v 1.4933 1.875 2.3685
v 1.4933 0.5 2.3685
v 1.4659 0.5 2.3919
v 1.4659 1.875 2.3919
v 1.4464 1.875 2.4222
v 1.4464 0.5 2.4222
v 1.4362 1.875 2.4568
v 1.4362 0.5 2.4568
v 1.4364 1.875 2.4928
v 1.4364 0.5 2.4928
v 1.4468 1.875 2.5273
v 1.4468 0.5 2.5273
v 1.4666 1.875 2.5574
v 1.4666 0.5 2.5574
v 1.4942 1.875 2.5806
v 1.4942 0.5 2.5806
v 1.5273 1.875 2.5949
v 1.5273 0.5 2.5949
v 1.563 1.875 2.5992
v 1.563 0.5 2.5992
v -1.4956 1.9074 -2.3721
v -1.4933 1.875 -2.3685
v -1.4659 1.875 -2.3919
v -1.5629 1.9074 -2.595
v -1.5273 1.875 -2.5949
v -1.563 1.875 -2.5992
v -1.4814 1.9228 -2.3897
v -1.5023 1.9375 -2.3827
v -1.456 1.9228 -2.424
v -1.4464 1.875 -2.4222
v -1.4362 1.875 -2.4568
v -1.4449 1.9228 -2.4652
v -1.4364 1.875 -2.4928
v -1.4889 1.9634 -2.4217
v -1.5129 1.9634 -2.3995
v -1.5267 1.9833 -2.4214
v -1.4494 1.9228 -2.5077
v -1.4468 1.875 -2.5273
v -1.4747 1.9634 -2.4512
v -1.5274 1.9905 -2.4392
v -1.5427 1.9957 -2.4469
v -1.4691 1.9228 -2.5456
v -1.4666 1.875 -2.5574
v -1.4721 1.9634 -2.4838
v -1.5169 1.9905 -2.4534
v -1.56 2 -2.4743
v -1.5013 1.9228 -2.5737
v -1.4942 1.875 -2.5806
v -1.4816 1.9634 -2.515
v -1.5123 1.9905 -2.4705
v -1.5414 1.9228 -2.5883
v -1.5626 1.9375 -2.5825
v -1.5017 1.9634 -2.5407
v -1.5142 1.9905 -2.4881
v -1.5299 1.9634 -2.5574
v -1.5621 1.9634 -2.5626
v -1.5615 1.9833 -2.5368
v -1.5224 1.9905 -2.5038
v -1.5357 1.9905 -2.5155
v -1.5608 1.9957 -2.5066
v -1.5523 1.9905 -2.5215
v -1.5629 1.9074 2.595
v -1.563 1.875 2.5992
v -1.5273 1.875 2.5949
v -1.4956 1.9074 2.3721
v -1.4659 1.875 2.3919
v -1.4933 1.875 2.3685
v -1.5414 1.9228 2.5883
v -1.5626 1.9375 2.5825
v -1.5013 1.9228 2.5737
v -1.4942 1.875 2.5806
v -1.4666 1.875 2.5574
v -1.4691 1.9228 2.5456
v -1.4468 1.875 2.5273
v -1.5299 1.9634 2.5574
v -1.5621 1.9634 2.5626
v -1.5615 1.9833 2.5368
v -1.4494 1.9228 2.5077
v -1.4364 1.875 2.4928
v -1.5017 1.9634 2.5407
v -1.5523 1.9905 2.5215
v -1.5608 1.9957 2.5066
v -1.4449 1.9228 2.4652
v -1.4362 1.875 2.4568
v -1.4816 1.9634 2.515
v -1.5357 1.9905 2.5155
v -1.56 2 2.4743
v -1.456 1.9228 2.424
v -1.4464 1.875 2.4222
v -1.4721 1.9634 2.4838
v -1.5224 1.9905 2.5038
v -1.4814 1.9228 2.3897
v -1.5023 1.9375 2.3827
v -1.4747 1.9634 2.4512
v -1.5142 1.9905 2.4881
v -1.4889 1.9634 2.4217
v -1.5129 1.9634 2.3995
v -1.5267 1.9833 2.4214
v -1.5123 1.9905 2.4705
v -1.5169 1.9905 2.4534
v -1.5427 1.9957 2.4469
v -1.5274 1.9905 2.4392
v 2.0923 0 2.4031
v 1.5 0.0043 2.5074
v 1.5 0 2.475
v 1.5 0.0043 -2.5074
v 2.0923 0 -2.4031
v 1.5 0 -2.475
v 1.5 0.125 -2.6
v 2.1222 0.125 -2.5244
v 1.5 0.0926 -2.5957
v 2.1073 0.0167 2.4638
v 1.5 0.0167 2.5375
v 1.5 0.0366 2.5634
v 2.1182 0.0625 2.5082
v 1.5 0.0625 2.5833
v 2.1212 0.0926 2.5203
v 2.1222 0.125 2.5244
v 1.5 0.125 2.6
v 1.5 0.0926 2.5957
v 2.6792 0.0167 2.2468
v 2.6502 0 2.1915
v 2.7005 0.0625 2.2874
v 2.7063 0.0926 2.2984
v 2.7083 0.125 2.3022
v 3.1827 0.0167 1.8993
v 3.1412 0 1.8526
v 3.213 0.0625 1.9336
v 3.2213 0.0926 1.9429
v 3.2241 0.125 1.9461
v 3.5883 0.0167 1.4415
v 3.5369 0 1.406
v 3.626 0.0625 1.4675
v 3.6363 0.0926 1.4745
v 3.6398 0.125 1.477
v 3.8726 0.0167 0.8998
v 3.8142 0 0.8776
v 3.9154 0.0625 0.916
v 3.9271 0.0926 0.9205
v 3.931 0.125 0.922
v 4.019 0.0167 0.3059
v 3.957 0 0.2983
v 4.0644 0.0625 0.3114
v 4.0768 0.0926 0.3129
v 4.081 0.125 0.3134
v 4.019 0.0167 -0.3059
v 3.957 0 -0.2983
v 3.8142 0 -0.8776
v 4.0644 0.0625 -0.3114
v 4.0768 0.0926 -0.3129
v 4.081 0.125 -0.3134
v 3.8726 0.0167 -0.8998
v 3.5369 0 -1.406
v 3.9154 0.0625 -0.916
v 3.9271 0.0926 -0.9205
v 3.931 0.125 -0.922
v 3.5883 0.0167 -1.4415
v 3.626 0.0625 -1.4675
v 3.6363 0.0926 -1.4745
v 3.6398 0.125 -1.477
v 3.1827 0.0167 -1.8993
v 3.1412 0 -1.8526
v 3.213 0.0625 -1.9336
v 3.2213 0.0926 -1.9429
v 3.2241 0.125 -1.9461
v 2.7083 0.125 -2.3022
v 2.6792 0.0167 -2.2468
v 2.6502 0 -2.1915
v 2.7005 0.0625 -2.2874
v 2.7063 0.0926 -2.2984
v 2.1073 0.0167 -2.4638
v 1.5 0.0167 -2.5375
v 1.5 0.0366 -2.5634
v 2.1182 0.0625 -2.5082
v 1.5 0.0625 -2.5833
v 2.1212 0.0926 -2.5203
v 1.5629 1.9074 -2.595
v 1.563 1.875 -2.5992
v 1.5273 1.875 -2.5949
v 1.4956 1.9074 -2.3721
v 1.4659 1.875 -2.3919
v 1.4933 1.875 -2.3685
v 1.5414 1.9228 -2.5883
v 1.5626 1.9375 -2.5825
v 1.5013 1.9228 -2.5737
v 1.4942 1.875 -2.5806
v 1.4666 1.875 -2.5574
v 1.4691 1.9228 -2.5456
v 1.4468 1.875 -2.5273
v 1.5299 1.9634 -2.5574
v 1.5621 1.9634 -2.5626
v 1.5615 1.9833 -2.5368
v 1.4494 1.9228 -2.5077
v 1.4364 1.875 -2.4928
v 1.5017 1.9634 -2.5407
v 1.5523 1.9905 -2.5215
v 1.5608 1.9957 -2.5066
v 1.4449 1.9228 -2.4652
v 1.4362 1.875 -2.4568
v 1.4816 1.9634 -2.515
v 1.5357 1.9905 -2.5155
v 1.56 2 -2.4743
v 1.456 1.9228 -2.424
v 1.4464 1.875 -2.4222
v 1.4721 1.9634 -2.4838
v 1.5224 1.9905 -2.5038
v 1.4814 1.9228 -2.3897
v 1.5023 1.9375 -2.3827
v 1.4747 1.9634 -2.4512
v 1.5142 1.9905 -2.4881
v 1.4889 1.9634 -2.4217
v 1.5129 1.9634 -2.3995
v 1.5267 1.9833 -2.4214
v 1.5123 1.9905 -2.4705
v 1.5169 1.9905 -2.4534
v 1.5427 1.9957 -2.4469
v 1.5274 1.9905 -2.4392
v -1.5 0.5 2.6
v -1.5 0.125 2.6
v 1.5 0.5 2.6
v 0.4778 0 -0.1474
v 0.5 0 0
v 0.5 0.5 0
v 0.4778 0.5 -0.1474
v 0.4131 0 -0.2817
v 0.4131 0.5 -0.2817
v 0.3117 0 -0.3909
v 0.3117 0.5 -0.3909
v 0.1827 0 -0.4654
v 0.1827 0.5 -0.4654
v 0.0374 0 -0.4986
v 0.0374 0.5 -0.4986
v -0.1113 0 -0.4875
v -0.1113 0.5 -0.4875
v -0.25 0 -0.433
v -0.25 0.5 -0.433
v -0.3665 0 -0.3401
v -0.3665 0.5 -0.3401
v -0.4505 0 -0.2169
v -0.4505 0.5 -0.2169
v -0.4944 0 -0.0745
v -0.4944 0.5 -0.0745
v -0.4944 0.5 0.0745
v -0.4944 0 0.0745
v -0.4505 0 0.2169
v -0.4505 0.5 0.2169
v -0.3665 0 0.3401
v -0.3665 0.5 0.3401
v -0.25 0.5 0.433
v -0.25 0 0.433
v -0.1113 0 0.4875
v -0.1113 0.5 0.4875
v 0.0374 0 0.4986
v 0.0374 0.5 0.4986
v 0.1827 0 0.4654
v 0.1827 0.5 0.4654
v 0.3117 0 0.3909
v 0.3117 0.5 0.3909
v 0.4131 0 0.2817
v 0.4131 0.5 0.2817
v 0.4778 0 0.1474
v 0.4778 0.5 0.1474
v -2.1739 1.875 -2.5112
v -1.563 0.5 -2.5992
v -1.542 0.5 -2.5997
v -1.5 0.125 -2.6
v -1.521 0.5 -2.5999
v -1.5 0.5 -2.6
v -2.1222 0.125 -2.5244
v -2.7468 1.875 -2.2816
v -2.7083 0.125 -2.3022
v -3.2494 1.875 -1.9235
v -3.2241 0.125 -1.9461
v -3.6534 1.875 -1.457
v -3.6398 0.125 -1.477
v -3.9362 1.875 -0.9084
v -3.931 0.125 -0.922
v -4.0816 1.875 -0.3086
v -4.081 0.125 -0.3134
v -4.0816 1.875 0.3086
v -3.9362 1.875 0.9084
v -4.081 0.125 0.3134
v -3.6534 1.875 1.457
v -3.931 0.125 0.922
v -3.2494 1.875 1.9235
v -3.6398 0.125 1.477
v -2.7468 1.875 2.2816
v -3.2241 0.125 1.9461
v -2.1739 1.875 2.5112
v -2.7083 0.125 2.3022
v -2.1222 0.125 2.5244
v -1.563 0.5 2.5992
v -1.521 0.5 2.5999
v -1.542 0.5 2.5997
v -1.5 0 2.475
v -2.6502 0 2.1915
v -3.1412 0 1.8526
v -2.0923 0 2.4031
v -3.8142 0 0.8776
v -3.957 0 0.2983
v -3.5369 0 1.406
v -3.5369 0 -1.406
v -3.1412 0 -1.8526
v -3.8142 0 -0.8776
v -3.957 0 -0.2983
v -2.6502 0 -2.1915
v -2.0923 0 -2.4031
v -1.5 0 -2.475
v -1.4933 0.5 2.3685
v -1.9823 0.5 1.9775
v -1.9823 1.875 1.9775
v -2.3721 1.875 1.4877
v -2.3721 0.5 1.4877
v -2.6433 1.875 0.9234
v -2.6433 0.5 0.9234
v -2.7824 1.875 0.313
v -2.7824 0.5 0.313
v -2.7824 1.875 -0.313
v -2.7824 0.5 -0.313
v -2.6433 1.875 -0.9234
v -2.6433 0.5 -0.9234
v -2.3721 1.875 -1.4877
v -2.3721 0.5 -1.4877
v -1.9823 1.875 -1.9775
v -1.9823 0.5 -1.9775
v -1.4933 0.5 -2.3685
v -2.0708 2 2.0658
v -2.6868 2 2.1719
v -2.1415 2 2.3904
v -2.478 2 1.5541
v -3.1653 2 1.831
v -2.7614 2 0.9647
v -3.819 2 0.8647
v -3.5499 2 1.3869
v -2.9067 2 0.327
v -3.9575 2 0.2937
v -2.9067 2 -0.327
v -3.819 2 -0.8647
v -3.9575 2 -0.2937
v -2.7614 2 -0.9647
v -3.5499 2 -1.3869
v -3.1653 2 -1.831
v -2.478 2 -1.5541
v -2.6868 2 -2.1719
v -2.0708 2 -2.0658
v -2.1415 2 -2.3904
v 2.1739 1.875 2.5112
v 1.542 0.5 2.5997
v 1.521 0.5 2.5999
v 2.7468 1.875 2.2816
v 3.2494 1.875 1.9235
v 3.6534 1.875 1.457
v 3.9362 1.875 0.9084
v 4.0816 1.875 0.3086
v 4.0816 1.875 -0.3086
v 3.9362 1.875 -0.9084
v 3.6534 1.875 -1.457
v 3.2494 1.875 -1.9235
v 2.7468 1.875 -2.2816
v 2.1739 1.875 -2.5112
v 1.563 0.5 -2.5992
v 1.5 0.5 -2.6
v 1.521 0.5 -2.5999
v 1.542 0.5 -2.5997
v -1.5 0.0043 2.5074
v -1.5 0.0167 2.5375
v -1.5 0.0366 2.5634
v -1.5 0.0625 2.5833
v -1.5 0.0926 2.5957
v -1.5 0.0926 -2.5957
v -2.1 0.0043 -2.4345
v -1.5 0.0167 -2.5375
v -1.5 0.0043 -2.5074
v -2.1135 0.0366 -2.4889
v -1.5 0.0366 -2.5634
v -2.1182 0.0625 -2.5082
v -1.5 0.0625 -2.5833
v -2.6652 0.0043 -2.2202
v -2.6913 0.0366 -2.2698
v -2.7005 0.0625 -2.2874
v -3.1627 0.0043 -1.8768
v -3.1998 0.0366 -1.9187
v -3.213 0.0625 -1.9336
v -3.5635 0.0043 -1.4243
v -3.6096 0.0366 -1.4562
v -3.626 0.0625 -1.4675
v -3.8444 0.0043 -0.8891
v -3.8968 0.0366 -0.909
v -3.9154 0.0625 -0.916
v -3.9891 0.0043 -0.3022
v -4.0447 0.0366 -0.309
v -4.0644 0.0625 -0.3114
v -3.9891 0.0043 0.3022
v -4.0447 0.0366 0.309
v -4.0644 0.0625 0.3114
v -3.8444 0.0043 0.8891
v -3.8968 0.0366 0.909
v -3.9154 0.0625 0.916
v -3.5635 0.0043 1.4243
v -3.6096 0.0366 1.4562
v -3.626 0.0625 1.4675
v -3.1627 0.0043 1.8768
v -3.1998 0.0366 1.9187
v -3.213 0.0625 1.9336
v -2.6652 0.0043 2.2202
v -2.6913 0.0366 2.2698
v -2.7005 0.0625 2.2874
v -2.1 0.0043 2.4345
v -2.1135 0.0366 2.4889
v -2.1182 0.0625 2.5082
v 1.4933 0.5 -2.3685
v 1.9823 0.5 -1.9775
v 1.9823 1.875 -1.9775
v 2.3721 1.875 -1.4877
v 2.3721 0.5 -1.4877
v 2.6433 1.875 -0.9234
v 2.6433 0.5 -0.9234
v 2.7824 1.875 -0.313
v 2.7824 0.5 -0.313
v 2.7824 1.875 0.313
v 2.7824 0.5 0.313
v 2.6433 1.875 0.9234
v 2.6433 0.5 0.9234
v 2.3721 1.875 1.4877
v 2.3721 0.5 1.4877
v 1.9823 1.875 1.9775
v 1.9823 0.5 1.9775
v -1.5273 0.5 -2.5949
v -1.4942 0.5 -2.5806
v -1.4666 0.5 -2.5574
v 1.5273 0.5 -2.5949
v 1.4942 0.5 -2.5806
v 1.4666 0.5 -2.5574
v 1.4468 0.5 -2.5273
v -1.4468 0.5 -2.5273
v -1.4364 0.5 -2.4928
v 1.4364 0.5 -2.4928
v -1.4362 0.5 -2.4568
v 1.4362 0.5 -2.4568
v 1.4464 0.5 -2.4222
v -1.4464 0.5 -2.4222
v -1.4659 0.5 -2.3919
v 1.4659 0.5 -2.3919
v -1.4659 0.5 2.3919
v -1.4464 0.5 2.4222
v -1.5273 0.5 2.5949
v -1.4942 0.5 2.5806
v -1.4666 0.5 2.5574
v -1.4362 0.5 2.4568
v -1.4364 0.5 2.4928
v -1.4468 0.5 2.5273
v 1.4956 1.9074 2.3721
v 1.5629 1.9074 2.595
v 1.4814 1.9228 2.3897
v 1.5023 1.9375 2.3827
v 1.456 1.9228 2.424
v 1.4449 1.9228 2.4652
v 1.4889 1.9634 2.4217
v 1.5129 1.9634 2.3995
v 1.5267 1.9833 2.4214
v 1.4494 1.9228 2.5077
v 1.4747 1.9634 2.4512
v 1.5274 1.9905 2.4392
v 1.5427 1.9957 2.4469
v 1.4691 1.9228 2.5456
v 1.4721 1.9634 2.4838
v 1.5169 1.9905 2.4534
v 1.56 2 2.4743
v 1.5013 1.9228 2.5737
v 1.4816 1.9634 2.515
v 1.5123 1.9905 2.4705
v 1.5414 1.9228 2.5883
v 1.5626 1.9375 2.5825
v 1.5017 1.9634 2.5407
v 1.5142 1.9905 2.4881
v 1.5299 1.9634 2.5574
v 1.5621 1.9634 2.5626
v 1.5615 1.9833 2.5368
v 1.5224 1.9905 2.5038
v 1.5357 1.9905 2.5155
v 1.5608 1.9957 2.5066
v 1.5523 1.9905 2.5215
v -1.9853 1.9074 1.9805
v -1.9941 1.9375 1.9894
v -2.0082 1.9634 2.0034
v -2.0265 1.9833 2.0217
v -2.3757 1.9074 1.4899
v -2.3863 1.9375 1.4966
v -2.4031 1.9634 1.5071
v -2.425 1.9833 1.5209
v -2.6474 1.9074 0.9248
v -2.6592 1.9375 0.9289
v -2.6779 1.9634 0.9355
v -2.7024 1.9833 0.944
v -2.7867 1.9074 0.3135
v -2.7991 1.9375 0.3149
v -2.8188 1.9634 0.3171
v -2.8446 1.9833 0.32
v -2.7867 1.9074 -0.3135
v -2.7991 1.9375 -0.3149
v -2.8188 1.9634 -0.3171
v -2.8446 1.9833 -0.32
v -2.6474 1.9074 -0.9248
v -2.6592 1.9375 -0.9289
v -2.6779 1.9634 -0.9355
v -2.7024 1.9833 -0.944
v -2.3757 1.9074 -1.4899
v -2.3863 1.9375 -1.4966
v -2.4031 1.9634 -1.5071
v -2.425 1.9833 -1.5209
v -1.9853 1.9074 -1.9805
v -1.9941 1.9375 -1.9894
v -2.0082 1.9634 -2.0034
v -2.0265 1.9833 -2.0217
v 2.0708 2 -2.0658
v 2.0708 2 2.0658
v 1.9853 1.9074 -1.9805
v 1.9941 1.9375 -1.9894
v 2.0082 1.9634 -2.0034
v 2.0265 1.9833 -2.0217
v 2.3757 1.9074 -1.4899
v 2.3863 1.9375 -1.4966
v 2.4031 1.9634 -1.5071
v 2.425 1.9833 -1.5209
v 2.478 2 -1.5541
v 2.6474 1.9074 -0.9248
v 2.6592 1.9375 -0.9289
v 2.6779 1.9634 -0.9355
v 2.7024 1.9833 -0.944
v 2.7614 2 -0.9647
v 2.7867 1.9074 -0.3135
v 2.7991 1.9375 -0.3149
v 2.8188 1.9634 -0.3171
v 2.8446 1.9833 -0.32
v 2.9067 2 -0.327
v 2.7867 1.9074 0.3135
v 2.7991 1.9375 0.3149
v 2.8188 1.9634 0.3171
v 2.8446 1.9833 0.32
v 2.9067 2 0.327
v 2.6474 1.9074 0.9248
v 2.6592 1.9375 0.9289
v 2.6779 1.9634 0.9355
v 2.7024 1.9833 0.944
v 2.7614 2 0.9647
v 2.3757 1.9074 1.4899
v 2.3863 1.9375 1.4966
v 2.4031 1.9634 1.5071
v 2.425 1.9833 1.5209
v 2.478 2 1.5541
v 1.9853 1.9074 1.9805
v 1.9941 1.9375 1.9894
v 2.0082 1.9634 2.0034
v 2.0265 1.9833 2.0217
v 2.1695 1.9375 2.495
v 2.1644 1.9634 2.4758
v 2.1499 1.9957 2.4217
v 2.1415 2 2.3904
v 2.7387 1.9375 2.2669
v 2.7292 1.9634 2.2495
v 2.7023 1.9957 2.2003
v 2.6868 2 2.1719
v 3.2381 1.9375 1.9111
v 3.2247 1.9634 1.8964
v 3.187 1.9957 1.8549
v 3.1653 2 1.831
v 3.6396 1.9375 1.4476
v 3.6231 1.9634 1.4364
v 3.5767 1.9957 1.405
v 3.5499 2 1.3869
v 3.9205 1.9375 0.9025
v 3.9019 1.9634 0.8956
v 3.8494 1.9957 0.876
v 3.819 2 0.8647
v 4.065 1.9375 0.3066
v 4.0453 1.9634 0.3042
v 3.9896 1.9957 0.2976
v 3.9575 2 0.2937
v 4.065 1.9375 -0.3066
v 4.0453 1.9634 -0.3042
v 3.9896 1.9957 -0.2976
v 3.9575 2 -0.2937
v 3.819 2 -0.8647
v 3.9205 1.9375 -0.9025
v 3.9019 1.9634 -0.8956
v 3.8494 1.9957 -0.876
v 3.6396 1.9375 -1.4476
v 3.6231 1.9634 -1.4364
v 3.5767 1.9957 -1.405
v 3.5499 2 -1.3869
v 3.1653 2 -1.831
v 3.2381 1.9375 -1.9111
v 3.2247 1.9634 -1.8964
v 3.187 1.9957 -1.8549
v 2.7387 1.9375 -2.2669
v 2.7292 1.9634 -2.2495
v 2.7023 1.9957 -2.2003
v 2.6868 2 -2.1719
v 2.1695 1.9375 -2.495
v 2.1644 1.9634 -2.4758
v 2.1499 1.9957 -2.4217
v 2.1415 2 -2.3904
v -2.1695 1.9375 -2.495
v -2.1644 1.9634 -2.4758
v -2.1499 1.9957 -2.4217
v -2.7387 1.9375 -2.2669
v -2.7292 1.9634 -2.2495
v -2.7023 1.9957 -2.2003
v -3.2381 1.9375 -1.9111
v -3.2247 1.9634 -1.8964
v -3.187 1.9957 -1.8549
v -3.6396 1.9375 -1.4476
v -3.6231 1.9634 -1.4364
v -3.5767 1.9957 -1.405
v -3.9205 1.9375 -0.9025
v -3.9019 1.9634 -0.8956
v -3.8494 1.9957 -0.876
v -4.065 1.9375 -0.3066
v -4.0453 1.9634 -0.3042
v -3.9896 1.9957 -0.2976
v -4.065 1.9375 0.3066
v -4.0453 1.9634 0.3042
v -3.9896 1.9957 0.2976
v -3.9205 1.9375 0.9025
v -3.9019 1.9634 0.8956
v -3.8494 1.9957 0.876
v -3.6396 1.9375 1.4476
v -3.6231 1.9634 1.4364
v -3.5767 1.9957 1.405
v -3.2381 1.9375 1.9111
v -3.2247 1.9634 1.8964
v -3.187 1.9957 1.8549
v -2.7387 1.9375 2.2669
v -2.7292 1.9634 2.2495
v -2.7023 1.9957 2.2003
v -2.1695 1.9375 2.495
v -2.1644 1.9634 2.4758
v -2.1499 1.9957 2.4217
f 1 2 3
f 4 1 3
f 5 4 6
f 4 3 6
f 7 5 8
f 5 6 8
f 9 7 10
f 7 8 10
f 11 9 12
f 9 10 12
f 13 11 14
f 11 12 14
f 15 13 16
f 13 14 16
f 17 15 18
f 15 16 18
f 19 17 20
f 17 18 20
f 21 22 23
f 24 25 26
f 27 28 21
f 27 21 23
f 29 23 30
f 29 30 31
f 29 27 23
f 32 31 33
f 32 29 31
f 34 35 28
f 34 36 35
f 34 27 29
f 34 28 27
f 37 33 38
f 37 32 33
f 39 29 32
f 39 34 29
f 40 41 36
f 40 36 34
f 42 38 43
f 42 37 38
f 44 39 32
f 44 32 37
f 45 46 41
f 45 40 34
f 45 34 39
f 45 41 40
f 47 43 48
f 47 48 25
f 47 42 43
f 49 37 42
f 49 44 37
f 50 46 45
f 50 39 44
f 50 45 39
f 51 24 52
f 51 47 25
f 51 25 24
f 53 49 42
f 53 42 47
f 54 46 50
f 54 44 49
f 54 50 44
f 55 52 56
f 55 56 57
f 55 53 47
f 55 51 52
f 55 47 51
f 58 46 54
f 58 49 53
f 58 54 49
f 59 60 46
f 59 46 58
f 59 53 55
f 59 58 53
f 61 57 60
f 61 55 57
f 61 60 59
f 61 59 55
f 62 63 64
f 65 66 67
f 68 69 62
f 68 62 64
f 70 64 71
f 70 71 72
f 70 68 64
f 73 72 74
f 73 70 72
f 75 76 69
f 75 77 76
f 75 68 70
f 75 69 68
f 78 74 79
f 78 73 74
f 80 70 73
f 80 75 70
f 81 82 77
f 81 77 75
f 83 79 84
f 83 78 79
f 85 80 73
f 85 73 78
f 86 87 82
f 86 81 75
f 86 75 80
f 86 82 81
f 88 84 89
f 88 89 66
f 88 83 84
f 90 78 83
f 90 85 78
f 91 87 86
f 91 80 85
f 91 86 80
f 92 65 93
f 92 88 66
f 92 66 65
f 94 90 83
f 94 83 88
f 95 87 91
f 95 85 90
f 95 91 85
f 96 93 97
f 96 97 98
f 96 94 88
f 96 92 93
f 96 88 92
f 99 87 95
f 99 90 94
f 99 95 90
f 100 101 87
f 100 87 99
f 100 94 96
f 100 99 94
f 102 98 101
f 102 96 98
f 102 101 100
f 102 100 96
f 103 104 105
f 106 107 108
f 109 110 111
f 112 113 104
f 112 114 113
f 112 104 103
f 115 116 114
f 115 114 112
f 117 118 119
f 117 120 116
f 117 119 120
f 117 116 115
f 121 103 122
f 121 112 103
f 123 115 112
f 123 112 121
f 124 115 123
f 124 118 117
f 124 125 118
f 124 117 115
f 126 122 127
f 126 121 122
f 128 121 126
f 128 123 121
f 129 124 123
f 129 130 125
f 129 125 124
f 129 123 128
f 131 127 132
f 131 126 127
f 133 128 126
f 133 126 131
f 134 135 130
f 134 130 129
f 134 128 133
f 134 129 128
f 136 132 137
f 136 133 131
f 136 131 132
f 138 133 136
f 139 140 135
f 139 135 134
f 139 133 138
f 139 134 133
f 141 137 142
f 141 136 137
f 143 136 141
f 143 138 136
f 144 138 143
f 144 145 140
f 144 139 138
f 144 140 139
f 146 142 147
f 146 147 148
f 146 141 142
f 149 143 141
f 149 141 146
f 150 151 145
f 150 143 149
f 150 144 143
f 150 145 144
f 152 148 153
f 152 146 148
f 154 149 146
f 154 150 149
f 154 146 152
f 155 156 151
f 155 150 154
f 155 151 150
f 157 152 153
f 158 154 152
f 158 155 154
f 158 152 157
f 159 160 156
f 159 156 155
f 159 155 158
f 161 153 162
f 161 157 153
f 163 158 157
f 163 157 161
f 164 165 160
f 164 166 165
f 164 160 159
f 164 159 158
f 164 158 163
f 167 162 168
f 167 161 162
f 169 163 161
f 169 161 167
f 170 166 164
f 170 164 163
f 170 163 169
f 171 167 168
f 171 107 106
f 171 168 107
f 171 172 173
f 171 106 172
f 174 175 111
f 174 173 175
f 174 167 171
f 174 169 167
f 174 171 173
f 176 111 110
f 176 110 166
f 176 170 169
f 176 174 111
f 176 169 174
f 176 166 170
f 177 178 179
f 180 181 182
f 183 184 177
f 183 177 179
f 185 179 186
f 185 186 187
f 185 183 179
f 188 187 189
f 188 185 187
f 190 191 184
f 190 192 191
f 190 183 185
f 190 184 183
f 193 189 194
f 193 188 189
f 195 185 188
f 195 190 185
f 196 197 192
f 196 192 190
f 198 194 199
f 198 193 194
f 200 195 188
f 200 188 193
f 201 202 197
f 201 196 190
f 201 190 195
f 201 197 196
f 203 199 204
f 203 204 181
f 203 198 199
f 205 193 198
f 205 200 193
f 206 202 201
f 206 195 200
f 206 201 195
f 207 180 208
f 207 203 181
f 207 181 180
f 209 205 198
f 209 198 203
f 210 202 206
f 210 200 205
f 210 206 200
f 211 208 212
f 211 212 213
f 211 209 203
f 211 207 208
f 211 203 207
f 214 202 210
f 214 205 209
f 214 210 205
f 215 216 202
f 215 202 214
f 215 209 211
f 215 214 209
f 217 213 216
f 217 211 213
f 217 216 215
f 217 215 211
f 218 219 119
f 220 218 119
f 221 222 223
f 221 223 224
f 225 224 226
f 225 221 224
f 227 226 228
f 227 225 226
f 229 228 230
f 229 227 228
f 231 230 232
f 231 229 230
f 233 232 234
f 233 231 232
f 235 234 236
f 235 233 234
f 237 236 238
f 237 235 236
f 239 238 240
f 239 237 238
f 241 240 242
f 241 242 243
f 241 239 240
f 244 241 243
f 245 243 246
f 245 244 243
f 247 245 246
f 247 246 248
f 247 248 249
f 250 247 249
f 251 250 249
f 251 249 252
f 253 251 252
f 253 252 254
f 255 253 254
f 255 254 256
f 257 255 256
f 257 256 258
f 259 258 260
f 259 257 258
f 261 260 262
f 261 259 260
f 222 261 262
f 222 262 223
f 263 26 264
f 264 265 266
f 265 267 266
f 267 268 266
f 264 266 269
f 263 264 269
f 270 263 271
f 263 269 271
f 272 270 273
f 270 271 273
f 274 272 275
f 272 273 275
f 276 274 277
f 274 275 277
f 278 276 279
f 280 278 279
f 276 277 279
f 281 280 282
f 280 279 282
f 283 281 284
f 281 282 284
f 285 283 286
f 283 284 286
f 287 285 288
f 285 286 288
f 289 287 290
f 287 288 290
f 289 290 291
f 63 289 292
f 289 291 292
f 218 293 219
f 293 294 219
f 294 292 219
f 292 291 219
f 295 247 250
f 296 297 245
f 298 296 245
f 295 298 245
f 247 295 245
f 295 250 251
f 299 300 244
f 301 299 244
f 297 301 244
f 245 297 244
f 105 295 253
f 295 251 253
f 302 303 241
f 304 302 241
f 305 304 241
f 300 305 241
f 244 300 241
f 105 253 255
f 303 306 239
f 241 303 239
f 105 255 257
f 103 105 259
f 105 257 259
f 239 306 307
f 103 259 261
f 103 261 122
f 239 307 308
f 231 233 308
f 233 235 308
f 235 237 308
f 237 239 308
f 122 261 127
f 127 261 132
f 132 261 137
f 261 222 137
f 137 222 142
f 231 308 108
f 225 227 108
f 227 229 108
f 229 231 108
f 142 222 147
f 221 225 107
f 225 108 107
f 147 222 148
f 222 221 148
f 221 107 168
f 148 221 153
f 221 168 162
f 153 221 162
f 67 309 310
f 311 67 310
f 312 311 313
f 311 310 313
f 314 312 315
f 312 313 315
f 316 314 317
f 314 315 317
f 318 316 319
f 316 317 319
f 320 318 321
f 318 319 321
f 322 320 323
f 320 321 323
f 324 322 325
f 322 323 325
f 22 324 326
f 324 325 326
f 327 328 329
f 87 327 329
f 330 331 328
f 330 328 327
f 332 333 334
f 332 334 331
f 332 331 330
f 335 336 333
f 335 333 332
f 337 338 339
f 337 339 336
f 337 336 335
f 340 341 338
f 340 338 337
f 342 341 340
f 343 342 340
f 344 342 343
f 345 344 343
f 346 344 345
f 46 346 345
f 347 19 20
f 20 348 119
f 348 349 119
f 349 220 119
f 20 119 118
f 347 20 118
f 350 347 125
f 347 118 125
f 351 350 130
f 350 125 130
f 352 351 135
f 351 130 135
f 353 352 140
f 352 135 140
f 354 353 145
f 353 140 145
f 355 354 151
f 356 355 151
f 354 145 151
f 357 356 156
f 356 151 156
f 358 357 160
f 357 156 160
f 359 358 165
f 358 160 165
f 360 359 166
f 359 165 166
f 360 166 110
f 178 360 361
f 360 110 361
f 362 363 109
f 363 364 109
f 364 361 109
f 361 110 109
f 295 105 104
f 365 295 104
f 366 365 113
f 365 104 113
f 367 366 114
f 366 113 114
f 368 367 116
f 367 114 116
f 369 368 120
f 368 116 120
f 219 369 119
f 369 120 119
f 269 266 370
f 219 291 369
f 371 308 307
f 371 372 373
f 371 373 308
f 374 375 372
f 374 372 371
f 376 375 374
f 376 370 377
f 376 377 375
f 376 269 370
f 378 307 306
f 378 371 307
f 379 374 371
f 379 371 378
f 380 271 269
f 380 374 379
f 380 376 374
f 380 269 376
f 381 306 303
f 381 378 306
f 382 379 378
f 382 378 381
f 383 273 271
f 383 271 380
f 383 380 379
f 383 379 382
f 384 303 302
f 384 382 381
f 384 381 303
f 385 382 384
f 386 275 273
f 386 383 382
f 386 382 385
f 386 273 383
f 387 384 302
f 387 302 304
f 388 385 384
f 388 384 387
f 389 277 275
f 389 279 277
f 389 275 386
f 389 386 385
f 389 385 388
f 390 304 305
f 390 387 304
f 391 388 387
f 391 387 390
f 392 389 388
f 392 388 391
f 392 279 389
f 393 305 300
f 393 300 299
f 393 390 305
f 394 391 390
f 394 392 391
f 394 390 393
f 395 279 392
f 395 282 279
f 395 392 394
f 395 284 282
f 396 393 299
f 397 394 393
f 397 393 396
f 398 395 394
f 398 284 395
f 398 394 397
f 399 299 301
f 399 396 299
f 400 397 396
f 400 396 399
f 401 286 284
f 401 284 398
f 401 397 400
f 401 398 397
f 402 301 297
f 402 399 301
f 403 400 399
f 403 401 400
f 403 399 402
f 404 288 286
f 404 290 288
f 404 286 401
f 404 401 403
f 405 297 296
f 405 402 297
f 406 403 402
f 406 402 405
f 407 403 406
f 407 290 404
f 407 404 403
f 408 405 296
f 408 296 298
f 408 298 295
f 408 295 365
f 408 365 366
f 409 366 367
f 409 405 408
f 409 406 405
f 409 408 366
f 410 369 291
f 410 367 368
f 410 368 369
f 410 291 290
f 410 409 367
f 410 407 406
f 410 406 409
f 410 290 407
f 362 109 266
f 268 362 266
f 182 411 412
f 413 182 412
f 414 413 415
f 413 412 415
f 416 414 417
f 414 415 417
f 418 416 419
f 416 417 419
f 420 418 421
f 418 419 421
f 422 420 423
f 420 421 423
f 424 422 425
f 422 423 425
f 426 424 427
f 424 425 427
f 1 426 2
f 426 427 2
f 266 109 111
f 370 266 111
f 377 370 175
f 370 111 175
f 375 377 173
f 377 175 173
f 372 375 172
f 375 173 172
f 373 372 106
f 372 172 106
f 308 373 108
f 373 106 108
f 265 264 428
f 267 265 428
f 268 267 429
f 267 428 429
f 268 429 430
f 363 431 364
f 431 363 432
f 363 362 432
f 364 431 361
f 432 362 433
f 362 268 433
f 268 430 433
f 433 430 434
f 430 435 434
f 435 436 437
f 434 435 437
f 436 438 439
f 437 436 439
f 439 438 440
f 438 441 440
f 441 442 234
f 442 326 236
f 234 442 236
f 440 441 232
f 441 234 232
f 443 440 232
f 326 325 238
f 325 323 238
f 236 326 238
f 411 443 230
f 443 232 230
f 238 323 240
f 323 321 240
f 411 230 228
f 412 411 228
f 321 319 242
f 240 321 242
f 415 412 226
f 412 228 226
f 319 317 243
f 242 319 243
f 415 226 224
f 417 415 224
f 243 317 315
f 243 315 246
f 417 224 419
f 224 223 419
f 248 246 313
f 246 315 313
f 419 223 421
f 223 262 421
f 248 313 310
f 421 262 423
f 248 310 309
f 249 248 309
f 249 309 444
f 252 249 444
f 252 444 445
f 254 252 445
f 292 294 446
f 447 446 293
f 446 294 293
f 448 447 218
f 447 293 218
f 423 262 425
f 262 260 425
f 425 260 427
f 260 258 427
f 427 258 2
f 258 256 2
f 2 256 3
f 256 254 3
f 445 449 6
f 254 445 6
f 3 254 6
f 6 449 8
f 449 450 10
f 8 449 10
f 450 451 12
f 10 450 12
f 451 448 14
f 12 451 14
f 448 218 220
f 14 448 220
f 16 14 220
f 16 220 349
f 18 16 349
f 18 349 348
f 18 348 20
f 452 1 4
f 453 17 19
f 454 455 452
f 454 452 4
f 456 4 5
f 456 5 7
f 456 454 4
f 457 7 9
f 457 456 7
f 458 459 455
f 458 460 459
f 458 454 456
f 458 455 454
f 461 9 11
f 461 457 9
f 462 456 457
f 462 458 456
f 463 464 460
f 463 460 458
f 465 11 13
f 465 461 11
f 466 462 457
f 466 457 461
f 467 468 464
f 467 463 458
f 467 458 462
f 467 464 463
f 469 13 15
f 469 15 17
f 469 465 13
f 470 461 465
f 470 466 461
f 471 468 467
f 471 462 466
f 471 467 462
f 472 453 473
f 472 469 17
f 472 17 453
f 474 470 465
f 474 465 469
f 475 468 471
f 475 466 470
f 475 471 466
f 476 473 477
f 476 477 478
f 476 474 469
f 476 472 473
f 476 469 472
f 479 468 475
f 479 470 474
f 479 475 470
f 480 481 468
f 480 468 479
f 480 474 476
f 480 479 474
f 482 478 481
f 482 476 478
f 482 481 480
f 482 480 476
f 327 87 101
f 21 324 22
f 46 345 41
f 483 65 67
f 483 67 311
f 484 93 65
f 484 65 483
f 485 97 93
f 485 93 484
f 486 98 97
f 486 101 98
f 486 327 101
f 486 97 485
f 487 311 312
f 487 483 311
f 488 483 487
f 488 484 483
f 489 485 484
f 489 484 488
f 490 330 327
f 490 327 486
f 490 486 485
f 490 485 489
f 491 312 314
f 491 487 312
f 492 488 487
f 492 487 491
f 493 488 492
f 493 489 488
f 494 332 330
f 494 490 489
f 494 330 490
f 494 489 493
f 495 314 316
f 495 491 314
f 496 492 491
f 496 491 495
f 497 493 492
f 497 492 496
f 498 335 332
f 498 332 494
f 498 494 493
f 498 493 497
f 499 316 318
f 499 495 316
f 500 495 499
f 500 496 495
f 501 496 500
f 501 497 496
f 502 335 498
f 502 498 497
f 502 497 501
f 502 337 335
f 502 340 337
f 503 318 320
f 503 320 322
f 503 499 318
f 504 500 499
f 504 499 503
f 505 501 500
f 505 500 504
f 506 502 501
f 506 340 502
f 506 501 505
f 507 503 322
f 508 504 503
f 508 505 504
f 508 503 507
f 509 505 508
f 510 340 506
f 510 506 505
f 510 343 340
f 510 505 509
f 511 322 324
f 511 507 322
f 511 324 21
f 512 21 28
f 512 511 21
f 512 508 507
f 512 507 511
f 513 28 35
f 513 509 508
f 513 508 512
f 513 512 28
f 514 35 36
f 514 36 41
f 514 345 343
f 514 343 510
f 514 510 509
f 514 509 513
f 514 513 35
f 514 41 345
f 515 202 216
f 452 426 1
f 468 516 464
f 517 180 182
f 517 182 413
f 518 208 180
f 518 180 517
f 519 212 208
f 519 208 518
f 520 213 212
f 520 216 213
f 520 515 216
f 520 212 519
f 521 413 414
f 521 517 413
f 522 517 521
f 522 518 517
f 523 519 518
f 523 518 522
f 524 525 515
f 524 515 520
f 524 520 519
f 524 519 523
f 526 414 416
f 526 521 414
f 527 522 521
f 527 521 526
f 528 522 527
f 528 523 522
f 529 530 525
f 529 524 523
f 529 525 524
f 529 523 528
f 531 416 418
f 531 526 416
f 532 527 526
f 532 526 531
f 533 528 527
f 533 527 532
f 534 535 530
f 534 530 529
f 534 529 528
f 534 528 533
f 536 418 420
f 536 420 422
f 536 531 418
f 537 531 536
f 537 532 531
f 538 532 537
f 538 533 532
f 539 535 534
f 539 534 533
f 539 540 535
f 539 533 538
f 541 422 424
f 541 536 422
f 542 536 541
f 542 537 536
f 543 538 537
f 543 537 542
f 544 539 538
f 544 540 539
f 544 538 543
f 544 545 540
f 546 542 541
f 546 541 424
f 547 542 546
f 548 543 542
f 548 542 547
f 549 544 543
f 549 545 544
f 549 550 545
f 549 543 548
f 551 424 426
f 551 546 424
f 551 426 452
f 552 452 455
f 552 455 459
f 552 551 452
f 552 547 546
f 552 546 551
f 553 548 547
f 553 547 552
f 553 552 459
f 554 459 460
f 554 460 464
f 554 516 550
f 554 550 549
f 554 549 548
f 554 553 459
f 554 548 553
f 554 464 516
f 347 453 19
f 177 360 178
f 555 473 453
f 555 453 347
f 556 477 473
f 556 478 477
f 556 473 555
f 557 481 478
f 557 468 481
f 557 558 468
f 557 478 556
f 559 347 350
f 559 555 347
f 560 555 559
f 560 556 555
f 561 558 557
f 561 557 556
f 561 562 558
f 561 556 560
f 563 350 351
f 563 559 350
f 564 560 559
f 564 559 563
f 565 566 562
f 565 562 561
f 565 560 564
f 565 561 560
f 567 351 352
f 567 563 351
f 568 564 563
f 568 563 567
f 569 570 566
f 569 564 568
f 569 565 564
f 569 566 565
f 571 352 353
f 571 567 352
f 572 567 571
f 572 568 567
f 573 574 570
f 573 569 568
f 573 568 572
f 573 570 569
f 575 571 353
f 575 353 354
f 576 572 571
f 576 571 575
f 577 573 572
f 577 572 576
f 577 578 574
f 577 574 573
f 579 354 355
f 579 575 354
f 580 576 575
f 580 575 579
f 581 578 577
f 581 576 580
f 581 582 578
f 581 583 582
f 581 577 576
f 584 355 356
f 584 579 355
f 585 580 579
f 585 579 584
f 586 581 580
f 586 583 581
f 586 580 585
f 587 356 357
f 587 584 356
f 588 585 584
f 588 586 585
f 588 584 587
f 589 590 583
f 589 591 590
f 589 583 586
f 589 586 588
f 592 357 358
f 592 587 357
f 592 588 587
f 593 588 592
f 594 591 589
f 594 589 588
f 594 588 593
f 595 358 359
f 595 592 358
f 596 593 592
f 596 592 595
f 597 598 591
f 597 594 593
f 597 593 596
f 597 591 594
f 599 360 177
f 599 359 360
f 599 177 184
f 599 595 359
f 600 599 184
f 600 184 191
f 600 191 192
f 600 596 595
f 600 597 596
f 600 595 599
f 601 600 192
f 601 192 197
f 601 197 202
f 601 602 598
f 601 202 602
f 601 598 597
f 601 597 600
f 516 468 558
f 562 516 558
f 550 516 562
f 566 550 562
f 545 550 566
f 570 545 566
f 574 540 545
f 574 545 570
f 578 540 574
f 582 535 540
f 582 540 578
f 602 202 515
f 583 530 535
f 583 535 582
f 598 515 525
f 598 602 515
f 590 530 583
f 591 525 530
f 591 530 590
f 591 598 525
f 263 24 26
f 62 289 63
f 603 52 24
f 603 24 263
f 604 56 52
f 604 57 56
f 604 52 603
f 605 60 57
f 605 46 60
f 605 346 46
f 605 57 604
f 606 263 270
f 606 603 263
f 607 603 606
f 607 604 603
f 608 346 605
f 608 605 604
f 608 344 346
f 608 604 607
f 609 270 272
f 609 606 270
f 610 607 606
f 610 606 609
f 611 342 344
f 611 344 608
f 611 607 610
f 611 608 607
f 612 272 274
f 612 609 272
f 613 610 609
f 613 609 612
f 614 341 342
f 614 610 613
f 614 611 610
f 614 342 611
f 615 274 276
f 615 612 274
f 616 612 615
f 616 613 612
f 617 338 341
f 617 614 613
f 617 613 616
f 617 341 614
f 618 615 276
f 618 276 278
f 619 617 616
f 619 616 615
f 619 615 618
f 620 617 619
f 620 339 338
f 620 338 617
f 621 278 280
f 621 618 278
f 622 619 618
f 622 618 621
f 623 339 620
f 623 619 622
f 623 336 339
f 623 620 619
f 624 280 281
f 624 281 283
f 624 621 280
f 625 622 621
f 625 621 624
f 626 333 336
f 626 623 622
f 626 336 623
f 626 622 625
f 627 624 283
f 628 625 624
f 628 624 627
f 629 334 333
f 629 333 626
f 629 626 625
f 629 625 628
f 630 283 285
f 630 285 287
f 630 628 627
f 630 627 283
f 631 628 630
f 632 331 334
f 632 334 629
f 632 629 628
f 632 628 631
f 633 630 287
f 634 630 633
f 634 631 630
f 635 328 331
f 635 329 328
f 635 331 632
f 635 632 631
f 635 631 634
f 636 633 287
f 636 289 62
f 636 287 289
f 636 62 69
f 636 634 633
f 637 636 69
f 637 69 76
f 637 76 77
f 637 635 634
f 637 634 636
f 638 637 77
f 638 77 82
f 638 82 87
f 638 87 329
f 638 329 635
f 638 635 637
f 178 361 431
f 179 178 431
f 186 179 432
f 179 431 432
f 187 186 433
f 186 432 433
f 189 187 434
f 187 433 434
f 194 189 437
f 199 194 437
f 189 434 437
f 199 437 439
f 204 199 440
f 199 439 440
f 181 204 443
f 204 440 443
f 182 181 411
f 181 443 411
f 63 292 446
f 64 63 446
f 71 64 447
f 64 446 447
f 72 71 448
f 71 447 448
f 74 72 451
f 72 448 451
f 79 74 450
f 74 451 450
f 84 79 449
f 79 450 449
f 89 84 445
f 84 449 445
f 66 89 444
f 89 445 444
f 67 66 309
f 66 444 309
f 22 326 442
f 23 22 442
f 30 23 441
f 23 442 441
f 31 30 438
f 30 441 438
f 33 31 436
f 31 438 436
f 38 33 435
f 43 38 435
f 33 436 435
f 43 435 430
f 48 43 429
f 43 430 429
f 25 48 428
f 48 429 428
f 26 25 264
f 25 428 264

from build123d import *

# Parameters (mm, degrees)
BOSS_EXTRUDE1_DEPTH   = 2
BOSS_EXTRUDE1_2_DEPTH = 2
BOSS_EXTRUDE2_DEPTH   = 0.5
HOLE2_OUTLINE_R       = 0.5
HOLE2_DEPTH           = 0.5
FILLET2_R             = 0.125
FILLET3_R             = 0.125


# Read off the part's stored shape, not the designer's step: Hole2
with BuildPart() as part:
    # Sketch1 → Boss-Extrude1 (new body)
    with BuildSketch(Plane(origin=(0, 0, 0), x_dir=(1, 0, 0), z_dir=(0, 1, 0))):
        with BuildLine():
            Line((-1.0392304845412224, 2.6), (-1.5, 2.6))
            ThreePointArc((-1.5, 2.6), (-4.1, -1.7e-16), (-1.4999999999999993, -2.6))
            Line((-1.5, -2.6), (-1.039230484541227, -2.6))
            ThreePointArc((-1.0392304845412341, -2.6000000000000365), (-2.8, 2.83e-15), (-1.0392304845412292, 2.6000000000000387))
        make_face()
    extrude(amount=BOSS_EXTRUDE1_DEPTH)



with BuildPart() as body_2:
    # Sketch1 → Boss-Extrude1 2 (new body)
    with BuildSketch(Plane(origin=(0, 0, 0), x_dir=(1, 0, 0), z_dir=(0, 1, 0))):
        with BuildLine():
            Line((1.4999999999999991, 2.6000000000000005), (1.039230484541188, 2.6000000000000005))
            ThreePointArc((1.0392304845411973, 2.6000000000000516), (2.8000000000000003, 3.11e-15), (1.039230484541203, -2.6000000000000494))
            Line((1.0392304845411937, -2.5999999999999996), (1.5000000000000009, -2.5999999999999996))
            ThreePointArc((1.5000000000000009, -2.5999999999999996), (4.1, 1.73e-15), (1.4999999999999984, 2.6000000000000005))
        make_face()
    extrude(amount=BOSS_EXTRUDE1_2_DEPTH)


with BuildPart() as part_1:
    add(part.part)

    add(body_2.part)  # Boss-Extrude2 merges body 2
    # Sketch1<3> → Boss-Extrude2 (add)
    with BuildSketch(Plane(origin=(0, 0, 0), x_dir=(1, 0, 0), z_dir=(0, 1, 0))):
        with BuildLine():
            Line((1.0392304845411884, 2.6000000000000005), (-1.0392304845412224, 2.6))
            ThreePointArc((-1.0392304845412292, 2.6000000000000387), (-2.8, 2.83e-15), (-1.0392304845412341, -2.6000000000000365))
            Line((-1.039230484541227, -2.6), (1.0392304845411937, -2.5999999999999996))
            ThreePointArc((1.039230484541203, -2.600000000000049), (2.3183879481997147, -1.5700564708450193), (2.8, -6.9e-16))
            ThreePointArc((2.8, 0), (2.318387948199713, 1.5700564708450213), (1.0392304845411973, 2.6000000000000516))
        make_face()
    extrude(amount=BOSS_EXTRUDE2_DEPTH)

    # Hole2 outline → Hole2 (cut)
    with BuildSketch(Plane(origin=(0, 0, 0), x_dir=(1, 0, 0), z_dir=(0, 1, 0))):
        Circle(HOLE2_OUTLINE_R)
    extrude(amount=HOLE2_DEPTH, mode=Mode.SUBTRACT)

    # Fillet2
    # the kernel refuses this fillet: 0.125 mm, written as the material it takes off along each edge
    with BuildSketch(Plane(origin=(1.4999999999999987, 0, -2.6000000000000005), x_dir=(0, 1, 3.55e-15), z_dir=(-1, 0, 1.5e-16))) as fillet2_piece_1:
        with BuildLine():
            CenterArc((FILLET2_R, -FILLET2_R), FILLET2_R, 90.00000000000021, 89.99999999999979)
            Line((4.3e-16, -FILLET2_R), (0, 0))
            Line((0, 0), (FILLET2_R, 0))
        make_face()
    extrude(amount=2.9999999999999987, mode=Mode.SUBTRACT)
    with BuildSketch(Plane(origin=(1.4999999999999996, 0, -3.3e-16), x_dir=(5.1e-16, 0, 1), z_dir=(-1, 0, 5.1e-16))) as fillet2_piece_2:
        with BuildLine():
            CenterArc((2.6 - FILLET2_R, FILLET2_R), FILLET2_R, 270, 90)
            Line((2.6, FILLET2_R), (2.6, 0))
            Line((2.6, 0), (2.6 - FILLET2_R, 0))
        make_face()
    revolve(axis=Axis((1.4999999999999996, 0, -3.3e-16), (0, 1, 0)), revolution_arc=180, mode=Mode.SUBTRACT)
    with BuildSketch(Plane(origin=(1.5000000000000009, 0, 2.5999999999999996), x_dir=(-1.5e-16, 0, -1), z_dir=(-1, 0, 1.5e-16))) as fillet2_piece_3:
        with BuildLine():
            CenterArc((FILLET2_R, -FILLET2_R), FILLET2_R, 90, 90)
            Line((0, -FILLET2_R), (0, 0))
            Line((0, 0), (FILLET2_R, 0))
        make_face()
    extrude(amount=3.0000000000000004, mode=Mode.SUBTRACT)
    with BuildSketch(Plane(origin=(-1.0392304845412306, 0.5, 2.6000000000000183), x_dir=(-0.8909362232588717, 0, -0.4541284466813525), z_dir=(0, 1, 0))) as fillet2_piece_4:
        with BuildLine():
            CenterArc((0.5210688048998693, 0.1244811743822189), FILLET2_R, 115.6197462863135, 149.1581720450634)
            Line((0.4670192388207316, 0.23719161935808136), (0.46161428221281786, 0.24846266385566762))
            ThreePointArc((0.46161428221281786, 0.24846266385566762), (0.404839646312147, 0.2203852471241299), (-0.00567660558351699, 0.01113670279073605))
            Line((-0.00567660558351699, 0.01113670279073605), (0.00113770481419139, -0.01244811743822212))
            ThreePointArc((0.00113770481419139, -0.01244811743822212), (0.254845878378973, -0.00087830616170155), (0.5085540519437544, -0.0124481174382219))
            Line((0.5085540519437544, -0.0124481174382219), (0.5096917567579465, -1e-17))
        make_face()
    extrude(amount=2.809500939581575, mode=Mode.SUBTRACT)
    with BuildSketch(Plane(origin=(1.0392304845411986, 0.5, 2.600000000000024), x_dir=(0.8909362232588801, 0, -0.45412844668133606), z_dir=(0, 1, 0))) as fillet2_piece_5:
        with BuildLine():
            CenterArc((0.5210688048999061, -0.12448117438221841), FILLET2_R, 95.22208166862436, 149.158172045063)
            Line((0.4670192388207701, -0.23719161935808164), (0.46161428221285655, -0.248462663855668))
            ThreePointArc((0.46161428221285655, -0.248462663855668), (0.4048396463121838, -0.22038524712413216), (-0.00567660558351678, -0.01113670279073616))
            Line((-0.00567660558351678, -0.01113670279073616), (0.00113770481419136, 0.01244811743822204))
            ThreePointArc((0.00113770481419136, 0.01244811743822204), (0.2548458783789898, 0.00087830616169669), (0.5085540519437883, 0.0124481174382219))
            Line((0.5085540519437883, 0.0124481174382219), (0.5096917567579807, 2e-17))
        make_face()
    extrude(amount=2.8095009395816612, mode=Mode.SUBTRACT)
    with BuildSketch(Plane(origin=(1.0392304845411924, 0.5, -2.600000000000026), x_dir=(0.9999989359619427, 0, 0.001458792302720678), z_dir=(0, 1, 0))) as fillet2_piece_6:
        with BuildLine():
            CenterArc((0.5209523714738641, -0.12496755127300935), FILLET2_R, 88.69445799122111, 149.1581720450468)
            Line((0.45444002573679215, -0.23080283775418345), (0.447788791163085, -0.24138636640230085))
            ThreePointArc((0.447788791163085, -0.24138636640230085), (0.22682229100640774, -0.11618451467849848), (-0.00462248445880959, -0.01161389845952106))
            Line((-0.00462248445880959, -0.01161389845952106), (-1.823490378401e-05, 0.01249998669952446))
            ThreePointArc((-1.823490378401e-05, 0.01249998669952446), (0.46075079027872196, 0.01317215372197879), (0.5240851762685466, 0.01249675512730089))
            Line((0.5240851762685466, 0.01249675512730089), (0.5238003758326663, 0))
        make_face()
    extrude(amount=2.8095009395816657, mode=Mode.SUBTRACT)
    with BuildSketch(Plane(origin=(-1.4999999999999996, 0, 0), x_dir=(-1.7e-16, 0, -1), z_dir=(1, 0, -1.7e-16))) as fillet2_piece_7:
        with BuildLine():
            CenterArc((2.6 - FILLET2_R, FILLET2_R), FILLET2_R, 270, 90)
            Line((2.6 - FILLET2_R, -1e-17), (2.6, 0))
            Line((2.6, 0), (2.6, FILLET2_R))
        make_face()
    revolve(axis=Axis((-1.4999999999999996, 0, 0), (0, 1, 0)), revolution_arc=180, mode=Mode.SUBTRACT)
    with BuildSketch(Plane(origin=(-1.0392304845412257, 0.5, -2.600000000000019), x_dir=(-0.9999989359619427, 0, 0.0014587923027088937), z_dir=(0, 1, 0))) as fillet2_piece_8:
        with BuildLine():
            CenterArc((0.5209523714738317, 0.1249675512730093), FILLET2_R, 122.14736996373313, 149.15817204504657)
            Line((0.4544400257367579, 0.23080283775418217), (0.44778879116305065, 0.24138636640229952))
            ThreePointArc((0.44778879116305065, 0.24138636640229952), (0.2268222910063884, 0.11618451467850208), (-0.00462248445880995, 0.01161389845952101))
            Line((-0.00462248445880995, 0.01161389845952101), (-1.823490378386e-05, -0.01249998669952446))
            ThreePointArc((-1.823490378386e-05, -0.01249998669952446), (0.46075079027869037, -0.01317215372197953), (0.524085176268516, -0.01249675512730089))
            Line((0.524085176268516, -0.01249675512730089), (0.5238003758326356, 0))
        make_face()
    extrude(amount=2.809500939581589, mode=Mode.SUBTRACT)

    # Fillet3
    fillet3_edges = [part_1.edges().sort_by_distance(p)[0] for p in [
        (4.1, 2, 5.853e-14),
        (-2.799999999999999, 2, -1.78e-15),
        (-4.1, 2, 6.033e-14),
        (-1.440341394717322, 2, -2.510422560661599),
        (-1.4403413947172043, 2, 2.5104225606616026),
        (2.8, 2, -2.2e-16),
        (1.4403413947173214, 2, -2.5104225606615973),
        (1.4403413947172052, 2, 2.510422560661605),
    ]]
    fillet(fillet3_edges, radius=FILLET3_R)


solid = part_1.part
